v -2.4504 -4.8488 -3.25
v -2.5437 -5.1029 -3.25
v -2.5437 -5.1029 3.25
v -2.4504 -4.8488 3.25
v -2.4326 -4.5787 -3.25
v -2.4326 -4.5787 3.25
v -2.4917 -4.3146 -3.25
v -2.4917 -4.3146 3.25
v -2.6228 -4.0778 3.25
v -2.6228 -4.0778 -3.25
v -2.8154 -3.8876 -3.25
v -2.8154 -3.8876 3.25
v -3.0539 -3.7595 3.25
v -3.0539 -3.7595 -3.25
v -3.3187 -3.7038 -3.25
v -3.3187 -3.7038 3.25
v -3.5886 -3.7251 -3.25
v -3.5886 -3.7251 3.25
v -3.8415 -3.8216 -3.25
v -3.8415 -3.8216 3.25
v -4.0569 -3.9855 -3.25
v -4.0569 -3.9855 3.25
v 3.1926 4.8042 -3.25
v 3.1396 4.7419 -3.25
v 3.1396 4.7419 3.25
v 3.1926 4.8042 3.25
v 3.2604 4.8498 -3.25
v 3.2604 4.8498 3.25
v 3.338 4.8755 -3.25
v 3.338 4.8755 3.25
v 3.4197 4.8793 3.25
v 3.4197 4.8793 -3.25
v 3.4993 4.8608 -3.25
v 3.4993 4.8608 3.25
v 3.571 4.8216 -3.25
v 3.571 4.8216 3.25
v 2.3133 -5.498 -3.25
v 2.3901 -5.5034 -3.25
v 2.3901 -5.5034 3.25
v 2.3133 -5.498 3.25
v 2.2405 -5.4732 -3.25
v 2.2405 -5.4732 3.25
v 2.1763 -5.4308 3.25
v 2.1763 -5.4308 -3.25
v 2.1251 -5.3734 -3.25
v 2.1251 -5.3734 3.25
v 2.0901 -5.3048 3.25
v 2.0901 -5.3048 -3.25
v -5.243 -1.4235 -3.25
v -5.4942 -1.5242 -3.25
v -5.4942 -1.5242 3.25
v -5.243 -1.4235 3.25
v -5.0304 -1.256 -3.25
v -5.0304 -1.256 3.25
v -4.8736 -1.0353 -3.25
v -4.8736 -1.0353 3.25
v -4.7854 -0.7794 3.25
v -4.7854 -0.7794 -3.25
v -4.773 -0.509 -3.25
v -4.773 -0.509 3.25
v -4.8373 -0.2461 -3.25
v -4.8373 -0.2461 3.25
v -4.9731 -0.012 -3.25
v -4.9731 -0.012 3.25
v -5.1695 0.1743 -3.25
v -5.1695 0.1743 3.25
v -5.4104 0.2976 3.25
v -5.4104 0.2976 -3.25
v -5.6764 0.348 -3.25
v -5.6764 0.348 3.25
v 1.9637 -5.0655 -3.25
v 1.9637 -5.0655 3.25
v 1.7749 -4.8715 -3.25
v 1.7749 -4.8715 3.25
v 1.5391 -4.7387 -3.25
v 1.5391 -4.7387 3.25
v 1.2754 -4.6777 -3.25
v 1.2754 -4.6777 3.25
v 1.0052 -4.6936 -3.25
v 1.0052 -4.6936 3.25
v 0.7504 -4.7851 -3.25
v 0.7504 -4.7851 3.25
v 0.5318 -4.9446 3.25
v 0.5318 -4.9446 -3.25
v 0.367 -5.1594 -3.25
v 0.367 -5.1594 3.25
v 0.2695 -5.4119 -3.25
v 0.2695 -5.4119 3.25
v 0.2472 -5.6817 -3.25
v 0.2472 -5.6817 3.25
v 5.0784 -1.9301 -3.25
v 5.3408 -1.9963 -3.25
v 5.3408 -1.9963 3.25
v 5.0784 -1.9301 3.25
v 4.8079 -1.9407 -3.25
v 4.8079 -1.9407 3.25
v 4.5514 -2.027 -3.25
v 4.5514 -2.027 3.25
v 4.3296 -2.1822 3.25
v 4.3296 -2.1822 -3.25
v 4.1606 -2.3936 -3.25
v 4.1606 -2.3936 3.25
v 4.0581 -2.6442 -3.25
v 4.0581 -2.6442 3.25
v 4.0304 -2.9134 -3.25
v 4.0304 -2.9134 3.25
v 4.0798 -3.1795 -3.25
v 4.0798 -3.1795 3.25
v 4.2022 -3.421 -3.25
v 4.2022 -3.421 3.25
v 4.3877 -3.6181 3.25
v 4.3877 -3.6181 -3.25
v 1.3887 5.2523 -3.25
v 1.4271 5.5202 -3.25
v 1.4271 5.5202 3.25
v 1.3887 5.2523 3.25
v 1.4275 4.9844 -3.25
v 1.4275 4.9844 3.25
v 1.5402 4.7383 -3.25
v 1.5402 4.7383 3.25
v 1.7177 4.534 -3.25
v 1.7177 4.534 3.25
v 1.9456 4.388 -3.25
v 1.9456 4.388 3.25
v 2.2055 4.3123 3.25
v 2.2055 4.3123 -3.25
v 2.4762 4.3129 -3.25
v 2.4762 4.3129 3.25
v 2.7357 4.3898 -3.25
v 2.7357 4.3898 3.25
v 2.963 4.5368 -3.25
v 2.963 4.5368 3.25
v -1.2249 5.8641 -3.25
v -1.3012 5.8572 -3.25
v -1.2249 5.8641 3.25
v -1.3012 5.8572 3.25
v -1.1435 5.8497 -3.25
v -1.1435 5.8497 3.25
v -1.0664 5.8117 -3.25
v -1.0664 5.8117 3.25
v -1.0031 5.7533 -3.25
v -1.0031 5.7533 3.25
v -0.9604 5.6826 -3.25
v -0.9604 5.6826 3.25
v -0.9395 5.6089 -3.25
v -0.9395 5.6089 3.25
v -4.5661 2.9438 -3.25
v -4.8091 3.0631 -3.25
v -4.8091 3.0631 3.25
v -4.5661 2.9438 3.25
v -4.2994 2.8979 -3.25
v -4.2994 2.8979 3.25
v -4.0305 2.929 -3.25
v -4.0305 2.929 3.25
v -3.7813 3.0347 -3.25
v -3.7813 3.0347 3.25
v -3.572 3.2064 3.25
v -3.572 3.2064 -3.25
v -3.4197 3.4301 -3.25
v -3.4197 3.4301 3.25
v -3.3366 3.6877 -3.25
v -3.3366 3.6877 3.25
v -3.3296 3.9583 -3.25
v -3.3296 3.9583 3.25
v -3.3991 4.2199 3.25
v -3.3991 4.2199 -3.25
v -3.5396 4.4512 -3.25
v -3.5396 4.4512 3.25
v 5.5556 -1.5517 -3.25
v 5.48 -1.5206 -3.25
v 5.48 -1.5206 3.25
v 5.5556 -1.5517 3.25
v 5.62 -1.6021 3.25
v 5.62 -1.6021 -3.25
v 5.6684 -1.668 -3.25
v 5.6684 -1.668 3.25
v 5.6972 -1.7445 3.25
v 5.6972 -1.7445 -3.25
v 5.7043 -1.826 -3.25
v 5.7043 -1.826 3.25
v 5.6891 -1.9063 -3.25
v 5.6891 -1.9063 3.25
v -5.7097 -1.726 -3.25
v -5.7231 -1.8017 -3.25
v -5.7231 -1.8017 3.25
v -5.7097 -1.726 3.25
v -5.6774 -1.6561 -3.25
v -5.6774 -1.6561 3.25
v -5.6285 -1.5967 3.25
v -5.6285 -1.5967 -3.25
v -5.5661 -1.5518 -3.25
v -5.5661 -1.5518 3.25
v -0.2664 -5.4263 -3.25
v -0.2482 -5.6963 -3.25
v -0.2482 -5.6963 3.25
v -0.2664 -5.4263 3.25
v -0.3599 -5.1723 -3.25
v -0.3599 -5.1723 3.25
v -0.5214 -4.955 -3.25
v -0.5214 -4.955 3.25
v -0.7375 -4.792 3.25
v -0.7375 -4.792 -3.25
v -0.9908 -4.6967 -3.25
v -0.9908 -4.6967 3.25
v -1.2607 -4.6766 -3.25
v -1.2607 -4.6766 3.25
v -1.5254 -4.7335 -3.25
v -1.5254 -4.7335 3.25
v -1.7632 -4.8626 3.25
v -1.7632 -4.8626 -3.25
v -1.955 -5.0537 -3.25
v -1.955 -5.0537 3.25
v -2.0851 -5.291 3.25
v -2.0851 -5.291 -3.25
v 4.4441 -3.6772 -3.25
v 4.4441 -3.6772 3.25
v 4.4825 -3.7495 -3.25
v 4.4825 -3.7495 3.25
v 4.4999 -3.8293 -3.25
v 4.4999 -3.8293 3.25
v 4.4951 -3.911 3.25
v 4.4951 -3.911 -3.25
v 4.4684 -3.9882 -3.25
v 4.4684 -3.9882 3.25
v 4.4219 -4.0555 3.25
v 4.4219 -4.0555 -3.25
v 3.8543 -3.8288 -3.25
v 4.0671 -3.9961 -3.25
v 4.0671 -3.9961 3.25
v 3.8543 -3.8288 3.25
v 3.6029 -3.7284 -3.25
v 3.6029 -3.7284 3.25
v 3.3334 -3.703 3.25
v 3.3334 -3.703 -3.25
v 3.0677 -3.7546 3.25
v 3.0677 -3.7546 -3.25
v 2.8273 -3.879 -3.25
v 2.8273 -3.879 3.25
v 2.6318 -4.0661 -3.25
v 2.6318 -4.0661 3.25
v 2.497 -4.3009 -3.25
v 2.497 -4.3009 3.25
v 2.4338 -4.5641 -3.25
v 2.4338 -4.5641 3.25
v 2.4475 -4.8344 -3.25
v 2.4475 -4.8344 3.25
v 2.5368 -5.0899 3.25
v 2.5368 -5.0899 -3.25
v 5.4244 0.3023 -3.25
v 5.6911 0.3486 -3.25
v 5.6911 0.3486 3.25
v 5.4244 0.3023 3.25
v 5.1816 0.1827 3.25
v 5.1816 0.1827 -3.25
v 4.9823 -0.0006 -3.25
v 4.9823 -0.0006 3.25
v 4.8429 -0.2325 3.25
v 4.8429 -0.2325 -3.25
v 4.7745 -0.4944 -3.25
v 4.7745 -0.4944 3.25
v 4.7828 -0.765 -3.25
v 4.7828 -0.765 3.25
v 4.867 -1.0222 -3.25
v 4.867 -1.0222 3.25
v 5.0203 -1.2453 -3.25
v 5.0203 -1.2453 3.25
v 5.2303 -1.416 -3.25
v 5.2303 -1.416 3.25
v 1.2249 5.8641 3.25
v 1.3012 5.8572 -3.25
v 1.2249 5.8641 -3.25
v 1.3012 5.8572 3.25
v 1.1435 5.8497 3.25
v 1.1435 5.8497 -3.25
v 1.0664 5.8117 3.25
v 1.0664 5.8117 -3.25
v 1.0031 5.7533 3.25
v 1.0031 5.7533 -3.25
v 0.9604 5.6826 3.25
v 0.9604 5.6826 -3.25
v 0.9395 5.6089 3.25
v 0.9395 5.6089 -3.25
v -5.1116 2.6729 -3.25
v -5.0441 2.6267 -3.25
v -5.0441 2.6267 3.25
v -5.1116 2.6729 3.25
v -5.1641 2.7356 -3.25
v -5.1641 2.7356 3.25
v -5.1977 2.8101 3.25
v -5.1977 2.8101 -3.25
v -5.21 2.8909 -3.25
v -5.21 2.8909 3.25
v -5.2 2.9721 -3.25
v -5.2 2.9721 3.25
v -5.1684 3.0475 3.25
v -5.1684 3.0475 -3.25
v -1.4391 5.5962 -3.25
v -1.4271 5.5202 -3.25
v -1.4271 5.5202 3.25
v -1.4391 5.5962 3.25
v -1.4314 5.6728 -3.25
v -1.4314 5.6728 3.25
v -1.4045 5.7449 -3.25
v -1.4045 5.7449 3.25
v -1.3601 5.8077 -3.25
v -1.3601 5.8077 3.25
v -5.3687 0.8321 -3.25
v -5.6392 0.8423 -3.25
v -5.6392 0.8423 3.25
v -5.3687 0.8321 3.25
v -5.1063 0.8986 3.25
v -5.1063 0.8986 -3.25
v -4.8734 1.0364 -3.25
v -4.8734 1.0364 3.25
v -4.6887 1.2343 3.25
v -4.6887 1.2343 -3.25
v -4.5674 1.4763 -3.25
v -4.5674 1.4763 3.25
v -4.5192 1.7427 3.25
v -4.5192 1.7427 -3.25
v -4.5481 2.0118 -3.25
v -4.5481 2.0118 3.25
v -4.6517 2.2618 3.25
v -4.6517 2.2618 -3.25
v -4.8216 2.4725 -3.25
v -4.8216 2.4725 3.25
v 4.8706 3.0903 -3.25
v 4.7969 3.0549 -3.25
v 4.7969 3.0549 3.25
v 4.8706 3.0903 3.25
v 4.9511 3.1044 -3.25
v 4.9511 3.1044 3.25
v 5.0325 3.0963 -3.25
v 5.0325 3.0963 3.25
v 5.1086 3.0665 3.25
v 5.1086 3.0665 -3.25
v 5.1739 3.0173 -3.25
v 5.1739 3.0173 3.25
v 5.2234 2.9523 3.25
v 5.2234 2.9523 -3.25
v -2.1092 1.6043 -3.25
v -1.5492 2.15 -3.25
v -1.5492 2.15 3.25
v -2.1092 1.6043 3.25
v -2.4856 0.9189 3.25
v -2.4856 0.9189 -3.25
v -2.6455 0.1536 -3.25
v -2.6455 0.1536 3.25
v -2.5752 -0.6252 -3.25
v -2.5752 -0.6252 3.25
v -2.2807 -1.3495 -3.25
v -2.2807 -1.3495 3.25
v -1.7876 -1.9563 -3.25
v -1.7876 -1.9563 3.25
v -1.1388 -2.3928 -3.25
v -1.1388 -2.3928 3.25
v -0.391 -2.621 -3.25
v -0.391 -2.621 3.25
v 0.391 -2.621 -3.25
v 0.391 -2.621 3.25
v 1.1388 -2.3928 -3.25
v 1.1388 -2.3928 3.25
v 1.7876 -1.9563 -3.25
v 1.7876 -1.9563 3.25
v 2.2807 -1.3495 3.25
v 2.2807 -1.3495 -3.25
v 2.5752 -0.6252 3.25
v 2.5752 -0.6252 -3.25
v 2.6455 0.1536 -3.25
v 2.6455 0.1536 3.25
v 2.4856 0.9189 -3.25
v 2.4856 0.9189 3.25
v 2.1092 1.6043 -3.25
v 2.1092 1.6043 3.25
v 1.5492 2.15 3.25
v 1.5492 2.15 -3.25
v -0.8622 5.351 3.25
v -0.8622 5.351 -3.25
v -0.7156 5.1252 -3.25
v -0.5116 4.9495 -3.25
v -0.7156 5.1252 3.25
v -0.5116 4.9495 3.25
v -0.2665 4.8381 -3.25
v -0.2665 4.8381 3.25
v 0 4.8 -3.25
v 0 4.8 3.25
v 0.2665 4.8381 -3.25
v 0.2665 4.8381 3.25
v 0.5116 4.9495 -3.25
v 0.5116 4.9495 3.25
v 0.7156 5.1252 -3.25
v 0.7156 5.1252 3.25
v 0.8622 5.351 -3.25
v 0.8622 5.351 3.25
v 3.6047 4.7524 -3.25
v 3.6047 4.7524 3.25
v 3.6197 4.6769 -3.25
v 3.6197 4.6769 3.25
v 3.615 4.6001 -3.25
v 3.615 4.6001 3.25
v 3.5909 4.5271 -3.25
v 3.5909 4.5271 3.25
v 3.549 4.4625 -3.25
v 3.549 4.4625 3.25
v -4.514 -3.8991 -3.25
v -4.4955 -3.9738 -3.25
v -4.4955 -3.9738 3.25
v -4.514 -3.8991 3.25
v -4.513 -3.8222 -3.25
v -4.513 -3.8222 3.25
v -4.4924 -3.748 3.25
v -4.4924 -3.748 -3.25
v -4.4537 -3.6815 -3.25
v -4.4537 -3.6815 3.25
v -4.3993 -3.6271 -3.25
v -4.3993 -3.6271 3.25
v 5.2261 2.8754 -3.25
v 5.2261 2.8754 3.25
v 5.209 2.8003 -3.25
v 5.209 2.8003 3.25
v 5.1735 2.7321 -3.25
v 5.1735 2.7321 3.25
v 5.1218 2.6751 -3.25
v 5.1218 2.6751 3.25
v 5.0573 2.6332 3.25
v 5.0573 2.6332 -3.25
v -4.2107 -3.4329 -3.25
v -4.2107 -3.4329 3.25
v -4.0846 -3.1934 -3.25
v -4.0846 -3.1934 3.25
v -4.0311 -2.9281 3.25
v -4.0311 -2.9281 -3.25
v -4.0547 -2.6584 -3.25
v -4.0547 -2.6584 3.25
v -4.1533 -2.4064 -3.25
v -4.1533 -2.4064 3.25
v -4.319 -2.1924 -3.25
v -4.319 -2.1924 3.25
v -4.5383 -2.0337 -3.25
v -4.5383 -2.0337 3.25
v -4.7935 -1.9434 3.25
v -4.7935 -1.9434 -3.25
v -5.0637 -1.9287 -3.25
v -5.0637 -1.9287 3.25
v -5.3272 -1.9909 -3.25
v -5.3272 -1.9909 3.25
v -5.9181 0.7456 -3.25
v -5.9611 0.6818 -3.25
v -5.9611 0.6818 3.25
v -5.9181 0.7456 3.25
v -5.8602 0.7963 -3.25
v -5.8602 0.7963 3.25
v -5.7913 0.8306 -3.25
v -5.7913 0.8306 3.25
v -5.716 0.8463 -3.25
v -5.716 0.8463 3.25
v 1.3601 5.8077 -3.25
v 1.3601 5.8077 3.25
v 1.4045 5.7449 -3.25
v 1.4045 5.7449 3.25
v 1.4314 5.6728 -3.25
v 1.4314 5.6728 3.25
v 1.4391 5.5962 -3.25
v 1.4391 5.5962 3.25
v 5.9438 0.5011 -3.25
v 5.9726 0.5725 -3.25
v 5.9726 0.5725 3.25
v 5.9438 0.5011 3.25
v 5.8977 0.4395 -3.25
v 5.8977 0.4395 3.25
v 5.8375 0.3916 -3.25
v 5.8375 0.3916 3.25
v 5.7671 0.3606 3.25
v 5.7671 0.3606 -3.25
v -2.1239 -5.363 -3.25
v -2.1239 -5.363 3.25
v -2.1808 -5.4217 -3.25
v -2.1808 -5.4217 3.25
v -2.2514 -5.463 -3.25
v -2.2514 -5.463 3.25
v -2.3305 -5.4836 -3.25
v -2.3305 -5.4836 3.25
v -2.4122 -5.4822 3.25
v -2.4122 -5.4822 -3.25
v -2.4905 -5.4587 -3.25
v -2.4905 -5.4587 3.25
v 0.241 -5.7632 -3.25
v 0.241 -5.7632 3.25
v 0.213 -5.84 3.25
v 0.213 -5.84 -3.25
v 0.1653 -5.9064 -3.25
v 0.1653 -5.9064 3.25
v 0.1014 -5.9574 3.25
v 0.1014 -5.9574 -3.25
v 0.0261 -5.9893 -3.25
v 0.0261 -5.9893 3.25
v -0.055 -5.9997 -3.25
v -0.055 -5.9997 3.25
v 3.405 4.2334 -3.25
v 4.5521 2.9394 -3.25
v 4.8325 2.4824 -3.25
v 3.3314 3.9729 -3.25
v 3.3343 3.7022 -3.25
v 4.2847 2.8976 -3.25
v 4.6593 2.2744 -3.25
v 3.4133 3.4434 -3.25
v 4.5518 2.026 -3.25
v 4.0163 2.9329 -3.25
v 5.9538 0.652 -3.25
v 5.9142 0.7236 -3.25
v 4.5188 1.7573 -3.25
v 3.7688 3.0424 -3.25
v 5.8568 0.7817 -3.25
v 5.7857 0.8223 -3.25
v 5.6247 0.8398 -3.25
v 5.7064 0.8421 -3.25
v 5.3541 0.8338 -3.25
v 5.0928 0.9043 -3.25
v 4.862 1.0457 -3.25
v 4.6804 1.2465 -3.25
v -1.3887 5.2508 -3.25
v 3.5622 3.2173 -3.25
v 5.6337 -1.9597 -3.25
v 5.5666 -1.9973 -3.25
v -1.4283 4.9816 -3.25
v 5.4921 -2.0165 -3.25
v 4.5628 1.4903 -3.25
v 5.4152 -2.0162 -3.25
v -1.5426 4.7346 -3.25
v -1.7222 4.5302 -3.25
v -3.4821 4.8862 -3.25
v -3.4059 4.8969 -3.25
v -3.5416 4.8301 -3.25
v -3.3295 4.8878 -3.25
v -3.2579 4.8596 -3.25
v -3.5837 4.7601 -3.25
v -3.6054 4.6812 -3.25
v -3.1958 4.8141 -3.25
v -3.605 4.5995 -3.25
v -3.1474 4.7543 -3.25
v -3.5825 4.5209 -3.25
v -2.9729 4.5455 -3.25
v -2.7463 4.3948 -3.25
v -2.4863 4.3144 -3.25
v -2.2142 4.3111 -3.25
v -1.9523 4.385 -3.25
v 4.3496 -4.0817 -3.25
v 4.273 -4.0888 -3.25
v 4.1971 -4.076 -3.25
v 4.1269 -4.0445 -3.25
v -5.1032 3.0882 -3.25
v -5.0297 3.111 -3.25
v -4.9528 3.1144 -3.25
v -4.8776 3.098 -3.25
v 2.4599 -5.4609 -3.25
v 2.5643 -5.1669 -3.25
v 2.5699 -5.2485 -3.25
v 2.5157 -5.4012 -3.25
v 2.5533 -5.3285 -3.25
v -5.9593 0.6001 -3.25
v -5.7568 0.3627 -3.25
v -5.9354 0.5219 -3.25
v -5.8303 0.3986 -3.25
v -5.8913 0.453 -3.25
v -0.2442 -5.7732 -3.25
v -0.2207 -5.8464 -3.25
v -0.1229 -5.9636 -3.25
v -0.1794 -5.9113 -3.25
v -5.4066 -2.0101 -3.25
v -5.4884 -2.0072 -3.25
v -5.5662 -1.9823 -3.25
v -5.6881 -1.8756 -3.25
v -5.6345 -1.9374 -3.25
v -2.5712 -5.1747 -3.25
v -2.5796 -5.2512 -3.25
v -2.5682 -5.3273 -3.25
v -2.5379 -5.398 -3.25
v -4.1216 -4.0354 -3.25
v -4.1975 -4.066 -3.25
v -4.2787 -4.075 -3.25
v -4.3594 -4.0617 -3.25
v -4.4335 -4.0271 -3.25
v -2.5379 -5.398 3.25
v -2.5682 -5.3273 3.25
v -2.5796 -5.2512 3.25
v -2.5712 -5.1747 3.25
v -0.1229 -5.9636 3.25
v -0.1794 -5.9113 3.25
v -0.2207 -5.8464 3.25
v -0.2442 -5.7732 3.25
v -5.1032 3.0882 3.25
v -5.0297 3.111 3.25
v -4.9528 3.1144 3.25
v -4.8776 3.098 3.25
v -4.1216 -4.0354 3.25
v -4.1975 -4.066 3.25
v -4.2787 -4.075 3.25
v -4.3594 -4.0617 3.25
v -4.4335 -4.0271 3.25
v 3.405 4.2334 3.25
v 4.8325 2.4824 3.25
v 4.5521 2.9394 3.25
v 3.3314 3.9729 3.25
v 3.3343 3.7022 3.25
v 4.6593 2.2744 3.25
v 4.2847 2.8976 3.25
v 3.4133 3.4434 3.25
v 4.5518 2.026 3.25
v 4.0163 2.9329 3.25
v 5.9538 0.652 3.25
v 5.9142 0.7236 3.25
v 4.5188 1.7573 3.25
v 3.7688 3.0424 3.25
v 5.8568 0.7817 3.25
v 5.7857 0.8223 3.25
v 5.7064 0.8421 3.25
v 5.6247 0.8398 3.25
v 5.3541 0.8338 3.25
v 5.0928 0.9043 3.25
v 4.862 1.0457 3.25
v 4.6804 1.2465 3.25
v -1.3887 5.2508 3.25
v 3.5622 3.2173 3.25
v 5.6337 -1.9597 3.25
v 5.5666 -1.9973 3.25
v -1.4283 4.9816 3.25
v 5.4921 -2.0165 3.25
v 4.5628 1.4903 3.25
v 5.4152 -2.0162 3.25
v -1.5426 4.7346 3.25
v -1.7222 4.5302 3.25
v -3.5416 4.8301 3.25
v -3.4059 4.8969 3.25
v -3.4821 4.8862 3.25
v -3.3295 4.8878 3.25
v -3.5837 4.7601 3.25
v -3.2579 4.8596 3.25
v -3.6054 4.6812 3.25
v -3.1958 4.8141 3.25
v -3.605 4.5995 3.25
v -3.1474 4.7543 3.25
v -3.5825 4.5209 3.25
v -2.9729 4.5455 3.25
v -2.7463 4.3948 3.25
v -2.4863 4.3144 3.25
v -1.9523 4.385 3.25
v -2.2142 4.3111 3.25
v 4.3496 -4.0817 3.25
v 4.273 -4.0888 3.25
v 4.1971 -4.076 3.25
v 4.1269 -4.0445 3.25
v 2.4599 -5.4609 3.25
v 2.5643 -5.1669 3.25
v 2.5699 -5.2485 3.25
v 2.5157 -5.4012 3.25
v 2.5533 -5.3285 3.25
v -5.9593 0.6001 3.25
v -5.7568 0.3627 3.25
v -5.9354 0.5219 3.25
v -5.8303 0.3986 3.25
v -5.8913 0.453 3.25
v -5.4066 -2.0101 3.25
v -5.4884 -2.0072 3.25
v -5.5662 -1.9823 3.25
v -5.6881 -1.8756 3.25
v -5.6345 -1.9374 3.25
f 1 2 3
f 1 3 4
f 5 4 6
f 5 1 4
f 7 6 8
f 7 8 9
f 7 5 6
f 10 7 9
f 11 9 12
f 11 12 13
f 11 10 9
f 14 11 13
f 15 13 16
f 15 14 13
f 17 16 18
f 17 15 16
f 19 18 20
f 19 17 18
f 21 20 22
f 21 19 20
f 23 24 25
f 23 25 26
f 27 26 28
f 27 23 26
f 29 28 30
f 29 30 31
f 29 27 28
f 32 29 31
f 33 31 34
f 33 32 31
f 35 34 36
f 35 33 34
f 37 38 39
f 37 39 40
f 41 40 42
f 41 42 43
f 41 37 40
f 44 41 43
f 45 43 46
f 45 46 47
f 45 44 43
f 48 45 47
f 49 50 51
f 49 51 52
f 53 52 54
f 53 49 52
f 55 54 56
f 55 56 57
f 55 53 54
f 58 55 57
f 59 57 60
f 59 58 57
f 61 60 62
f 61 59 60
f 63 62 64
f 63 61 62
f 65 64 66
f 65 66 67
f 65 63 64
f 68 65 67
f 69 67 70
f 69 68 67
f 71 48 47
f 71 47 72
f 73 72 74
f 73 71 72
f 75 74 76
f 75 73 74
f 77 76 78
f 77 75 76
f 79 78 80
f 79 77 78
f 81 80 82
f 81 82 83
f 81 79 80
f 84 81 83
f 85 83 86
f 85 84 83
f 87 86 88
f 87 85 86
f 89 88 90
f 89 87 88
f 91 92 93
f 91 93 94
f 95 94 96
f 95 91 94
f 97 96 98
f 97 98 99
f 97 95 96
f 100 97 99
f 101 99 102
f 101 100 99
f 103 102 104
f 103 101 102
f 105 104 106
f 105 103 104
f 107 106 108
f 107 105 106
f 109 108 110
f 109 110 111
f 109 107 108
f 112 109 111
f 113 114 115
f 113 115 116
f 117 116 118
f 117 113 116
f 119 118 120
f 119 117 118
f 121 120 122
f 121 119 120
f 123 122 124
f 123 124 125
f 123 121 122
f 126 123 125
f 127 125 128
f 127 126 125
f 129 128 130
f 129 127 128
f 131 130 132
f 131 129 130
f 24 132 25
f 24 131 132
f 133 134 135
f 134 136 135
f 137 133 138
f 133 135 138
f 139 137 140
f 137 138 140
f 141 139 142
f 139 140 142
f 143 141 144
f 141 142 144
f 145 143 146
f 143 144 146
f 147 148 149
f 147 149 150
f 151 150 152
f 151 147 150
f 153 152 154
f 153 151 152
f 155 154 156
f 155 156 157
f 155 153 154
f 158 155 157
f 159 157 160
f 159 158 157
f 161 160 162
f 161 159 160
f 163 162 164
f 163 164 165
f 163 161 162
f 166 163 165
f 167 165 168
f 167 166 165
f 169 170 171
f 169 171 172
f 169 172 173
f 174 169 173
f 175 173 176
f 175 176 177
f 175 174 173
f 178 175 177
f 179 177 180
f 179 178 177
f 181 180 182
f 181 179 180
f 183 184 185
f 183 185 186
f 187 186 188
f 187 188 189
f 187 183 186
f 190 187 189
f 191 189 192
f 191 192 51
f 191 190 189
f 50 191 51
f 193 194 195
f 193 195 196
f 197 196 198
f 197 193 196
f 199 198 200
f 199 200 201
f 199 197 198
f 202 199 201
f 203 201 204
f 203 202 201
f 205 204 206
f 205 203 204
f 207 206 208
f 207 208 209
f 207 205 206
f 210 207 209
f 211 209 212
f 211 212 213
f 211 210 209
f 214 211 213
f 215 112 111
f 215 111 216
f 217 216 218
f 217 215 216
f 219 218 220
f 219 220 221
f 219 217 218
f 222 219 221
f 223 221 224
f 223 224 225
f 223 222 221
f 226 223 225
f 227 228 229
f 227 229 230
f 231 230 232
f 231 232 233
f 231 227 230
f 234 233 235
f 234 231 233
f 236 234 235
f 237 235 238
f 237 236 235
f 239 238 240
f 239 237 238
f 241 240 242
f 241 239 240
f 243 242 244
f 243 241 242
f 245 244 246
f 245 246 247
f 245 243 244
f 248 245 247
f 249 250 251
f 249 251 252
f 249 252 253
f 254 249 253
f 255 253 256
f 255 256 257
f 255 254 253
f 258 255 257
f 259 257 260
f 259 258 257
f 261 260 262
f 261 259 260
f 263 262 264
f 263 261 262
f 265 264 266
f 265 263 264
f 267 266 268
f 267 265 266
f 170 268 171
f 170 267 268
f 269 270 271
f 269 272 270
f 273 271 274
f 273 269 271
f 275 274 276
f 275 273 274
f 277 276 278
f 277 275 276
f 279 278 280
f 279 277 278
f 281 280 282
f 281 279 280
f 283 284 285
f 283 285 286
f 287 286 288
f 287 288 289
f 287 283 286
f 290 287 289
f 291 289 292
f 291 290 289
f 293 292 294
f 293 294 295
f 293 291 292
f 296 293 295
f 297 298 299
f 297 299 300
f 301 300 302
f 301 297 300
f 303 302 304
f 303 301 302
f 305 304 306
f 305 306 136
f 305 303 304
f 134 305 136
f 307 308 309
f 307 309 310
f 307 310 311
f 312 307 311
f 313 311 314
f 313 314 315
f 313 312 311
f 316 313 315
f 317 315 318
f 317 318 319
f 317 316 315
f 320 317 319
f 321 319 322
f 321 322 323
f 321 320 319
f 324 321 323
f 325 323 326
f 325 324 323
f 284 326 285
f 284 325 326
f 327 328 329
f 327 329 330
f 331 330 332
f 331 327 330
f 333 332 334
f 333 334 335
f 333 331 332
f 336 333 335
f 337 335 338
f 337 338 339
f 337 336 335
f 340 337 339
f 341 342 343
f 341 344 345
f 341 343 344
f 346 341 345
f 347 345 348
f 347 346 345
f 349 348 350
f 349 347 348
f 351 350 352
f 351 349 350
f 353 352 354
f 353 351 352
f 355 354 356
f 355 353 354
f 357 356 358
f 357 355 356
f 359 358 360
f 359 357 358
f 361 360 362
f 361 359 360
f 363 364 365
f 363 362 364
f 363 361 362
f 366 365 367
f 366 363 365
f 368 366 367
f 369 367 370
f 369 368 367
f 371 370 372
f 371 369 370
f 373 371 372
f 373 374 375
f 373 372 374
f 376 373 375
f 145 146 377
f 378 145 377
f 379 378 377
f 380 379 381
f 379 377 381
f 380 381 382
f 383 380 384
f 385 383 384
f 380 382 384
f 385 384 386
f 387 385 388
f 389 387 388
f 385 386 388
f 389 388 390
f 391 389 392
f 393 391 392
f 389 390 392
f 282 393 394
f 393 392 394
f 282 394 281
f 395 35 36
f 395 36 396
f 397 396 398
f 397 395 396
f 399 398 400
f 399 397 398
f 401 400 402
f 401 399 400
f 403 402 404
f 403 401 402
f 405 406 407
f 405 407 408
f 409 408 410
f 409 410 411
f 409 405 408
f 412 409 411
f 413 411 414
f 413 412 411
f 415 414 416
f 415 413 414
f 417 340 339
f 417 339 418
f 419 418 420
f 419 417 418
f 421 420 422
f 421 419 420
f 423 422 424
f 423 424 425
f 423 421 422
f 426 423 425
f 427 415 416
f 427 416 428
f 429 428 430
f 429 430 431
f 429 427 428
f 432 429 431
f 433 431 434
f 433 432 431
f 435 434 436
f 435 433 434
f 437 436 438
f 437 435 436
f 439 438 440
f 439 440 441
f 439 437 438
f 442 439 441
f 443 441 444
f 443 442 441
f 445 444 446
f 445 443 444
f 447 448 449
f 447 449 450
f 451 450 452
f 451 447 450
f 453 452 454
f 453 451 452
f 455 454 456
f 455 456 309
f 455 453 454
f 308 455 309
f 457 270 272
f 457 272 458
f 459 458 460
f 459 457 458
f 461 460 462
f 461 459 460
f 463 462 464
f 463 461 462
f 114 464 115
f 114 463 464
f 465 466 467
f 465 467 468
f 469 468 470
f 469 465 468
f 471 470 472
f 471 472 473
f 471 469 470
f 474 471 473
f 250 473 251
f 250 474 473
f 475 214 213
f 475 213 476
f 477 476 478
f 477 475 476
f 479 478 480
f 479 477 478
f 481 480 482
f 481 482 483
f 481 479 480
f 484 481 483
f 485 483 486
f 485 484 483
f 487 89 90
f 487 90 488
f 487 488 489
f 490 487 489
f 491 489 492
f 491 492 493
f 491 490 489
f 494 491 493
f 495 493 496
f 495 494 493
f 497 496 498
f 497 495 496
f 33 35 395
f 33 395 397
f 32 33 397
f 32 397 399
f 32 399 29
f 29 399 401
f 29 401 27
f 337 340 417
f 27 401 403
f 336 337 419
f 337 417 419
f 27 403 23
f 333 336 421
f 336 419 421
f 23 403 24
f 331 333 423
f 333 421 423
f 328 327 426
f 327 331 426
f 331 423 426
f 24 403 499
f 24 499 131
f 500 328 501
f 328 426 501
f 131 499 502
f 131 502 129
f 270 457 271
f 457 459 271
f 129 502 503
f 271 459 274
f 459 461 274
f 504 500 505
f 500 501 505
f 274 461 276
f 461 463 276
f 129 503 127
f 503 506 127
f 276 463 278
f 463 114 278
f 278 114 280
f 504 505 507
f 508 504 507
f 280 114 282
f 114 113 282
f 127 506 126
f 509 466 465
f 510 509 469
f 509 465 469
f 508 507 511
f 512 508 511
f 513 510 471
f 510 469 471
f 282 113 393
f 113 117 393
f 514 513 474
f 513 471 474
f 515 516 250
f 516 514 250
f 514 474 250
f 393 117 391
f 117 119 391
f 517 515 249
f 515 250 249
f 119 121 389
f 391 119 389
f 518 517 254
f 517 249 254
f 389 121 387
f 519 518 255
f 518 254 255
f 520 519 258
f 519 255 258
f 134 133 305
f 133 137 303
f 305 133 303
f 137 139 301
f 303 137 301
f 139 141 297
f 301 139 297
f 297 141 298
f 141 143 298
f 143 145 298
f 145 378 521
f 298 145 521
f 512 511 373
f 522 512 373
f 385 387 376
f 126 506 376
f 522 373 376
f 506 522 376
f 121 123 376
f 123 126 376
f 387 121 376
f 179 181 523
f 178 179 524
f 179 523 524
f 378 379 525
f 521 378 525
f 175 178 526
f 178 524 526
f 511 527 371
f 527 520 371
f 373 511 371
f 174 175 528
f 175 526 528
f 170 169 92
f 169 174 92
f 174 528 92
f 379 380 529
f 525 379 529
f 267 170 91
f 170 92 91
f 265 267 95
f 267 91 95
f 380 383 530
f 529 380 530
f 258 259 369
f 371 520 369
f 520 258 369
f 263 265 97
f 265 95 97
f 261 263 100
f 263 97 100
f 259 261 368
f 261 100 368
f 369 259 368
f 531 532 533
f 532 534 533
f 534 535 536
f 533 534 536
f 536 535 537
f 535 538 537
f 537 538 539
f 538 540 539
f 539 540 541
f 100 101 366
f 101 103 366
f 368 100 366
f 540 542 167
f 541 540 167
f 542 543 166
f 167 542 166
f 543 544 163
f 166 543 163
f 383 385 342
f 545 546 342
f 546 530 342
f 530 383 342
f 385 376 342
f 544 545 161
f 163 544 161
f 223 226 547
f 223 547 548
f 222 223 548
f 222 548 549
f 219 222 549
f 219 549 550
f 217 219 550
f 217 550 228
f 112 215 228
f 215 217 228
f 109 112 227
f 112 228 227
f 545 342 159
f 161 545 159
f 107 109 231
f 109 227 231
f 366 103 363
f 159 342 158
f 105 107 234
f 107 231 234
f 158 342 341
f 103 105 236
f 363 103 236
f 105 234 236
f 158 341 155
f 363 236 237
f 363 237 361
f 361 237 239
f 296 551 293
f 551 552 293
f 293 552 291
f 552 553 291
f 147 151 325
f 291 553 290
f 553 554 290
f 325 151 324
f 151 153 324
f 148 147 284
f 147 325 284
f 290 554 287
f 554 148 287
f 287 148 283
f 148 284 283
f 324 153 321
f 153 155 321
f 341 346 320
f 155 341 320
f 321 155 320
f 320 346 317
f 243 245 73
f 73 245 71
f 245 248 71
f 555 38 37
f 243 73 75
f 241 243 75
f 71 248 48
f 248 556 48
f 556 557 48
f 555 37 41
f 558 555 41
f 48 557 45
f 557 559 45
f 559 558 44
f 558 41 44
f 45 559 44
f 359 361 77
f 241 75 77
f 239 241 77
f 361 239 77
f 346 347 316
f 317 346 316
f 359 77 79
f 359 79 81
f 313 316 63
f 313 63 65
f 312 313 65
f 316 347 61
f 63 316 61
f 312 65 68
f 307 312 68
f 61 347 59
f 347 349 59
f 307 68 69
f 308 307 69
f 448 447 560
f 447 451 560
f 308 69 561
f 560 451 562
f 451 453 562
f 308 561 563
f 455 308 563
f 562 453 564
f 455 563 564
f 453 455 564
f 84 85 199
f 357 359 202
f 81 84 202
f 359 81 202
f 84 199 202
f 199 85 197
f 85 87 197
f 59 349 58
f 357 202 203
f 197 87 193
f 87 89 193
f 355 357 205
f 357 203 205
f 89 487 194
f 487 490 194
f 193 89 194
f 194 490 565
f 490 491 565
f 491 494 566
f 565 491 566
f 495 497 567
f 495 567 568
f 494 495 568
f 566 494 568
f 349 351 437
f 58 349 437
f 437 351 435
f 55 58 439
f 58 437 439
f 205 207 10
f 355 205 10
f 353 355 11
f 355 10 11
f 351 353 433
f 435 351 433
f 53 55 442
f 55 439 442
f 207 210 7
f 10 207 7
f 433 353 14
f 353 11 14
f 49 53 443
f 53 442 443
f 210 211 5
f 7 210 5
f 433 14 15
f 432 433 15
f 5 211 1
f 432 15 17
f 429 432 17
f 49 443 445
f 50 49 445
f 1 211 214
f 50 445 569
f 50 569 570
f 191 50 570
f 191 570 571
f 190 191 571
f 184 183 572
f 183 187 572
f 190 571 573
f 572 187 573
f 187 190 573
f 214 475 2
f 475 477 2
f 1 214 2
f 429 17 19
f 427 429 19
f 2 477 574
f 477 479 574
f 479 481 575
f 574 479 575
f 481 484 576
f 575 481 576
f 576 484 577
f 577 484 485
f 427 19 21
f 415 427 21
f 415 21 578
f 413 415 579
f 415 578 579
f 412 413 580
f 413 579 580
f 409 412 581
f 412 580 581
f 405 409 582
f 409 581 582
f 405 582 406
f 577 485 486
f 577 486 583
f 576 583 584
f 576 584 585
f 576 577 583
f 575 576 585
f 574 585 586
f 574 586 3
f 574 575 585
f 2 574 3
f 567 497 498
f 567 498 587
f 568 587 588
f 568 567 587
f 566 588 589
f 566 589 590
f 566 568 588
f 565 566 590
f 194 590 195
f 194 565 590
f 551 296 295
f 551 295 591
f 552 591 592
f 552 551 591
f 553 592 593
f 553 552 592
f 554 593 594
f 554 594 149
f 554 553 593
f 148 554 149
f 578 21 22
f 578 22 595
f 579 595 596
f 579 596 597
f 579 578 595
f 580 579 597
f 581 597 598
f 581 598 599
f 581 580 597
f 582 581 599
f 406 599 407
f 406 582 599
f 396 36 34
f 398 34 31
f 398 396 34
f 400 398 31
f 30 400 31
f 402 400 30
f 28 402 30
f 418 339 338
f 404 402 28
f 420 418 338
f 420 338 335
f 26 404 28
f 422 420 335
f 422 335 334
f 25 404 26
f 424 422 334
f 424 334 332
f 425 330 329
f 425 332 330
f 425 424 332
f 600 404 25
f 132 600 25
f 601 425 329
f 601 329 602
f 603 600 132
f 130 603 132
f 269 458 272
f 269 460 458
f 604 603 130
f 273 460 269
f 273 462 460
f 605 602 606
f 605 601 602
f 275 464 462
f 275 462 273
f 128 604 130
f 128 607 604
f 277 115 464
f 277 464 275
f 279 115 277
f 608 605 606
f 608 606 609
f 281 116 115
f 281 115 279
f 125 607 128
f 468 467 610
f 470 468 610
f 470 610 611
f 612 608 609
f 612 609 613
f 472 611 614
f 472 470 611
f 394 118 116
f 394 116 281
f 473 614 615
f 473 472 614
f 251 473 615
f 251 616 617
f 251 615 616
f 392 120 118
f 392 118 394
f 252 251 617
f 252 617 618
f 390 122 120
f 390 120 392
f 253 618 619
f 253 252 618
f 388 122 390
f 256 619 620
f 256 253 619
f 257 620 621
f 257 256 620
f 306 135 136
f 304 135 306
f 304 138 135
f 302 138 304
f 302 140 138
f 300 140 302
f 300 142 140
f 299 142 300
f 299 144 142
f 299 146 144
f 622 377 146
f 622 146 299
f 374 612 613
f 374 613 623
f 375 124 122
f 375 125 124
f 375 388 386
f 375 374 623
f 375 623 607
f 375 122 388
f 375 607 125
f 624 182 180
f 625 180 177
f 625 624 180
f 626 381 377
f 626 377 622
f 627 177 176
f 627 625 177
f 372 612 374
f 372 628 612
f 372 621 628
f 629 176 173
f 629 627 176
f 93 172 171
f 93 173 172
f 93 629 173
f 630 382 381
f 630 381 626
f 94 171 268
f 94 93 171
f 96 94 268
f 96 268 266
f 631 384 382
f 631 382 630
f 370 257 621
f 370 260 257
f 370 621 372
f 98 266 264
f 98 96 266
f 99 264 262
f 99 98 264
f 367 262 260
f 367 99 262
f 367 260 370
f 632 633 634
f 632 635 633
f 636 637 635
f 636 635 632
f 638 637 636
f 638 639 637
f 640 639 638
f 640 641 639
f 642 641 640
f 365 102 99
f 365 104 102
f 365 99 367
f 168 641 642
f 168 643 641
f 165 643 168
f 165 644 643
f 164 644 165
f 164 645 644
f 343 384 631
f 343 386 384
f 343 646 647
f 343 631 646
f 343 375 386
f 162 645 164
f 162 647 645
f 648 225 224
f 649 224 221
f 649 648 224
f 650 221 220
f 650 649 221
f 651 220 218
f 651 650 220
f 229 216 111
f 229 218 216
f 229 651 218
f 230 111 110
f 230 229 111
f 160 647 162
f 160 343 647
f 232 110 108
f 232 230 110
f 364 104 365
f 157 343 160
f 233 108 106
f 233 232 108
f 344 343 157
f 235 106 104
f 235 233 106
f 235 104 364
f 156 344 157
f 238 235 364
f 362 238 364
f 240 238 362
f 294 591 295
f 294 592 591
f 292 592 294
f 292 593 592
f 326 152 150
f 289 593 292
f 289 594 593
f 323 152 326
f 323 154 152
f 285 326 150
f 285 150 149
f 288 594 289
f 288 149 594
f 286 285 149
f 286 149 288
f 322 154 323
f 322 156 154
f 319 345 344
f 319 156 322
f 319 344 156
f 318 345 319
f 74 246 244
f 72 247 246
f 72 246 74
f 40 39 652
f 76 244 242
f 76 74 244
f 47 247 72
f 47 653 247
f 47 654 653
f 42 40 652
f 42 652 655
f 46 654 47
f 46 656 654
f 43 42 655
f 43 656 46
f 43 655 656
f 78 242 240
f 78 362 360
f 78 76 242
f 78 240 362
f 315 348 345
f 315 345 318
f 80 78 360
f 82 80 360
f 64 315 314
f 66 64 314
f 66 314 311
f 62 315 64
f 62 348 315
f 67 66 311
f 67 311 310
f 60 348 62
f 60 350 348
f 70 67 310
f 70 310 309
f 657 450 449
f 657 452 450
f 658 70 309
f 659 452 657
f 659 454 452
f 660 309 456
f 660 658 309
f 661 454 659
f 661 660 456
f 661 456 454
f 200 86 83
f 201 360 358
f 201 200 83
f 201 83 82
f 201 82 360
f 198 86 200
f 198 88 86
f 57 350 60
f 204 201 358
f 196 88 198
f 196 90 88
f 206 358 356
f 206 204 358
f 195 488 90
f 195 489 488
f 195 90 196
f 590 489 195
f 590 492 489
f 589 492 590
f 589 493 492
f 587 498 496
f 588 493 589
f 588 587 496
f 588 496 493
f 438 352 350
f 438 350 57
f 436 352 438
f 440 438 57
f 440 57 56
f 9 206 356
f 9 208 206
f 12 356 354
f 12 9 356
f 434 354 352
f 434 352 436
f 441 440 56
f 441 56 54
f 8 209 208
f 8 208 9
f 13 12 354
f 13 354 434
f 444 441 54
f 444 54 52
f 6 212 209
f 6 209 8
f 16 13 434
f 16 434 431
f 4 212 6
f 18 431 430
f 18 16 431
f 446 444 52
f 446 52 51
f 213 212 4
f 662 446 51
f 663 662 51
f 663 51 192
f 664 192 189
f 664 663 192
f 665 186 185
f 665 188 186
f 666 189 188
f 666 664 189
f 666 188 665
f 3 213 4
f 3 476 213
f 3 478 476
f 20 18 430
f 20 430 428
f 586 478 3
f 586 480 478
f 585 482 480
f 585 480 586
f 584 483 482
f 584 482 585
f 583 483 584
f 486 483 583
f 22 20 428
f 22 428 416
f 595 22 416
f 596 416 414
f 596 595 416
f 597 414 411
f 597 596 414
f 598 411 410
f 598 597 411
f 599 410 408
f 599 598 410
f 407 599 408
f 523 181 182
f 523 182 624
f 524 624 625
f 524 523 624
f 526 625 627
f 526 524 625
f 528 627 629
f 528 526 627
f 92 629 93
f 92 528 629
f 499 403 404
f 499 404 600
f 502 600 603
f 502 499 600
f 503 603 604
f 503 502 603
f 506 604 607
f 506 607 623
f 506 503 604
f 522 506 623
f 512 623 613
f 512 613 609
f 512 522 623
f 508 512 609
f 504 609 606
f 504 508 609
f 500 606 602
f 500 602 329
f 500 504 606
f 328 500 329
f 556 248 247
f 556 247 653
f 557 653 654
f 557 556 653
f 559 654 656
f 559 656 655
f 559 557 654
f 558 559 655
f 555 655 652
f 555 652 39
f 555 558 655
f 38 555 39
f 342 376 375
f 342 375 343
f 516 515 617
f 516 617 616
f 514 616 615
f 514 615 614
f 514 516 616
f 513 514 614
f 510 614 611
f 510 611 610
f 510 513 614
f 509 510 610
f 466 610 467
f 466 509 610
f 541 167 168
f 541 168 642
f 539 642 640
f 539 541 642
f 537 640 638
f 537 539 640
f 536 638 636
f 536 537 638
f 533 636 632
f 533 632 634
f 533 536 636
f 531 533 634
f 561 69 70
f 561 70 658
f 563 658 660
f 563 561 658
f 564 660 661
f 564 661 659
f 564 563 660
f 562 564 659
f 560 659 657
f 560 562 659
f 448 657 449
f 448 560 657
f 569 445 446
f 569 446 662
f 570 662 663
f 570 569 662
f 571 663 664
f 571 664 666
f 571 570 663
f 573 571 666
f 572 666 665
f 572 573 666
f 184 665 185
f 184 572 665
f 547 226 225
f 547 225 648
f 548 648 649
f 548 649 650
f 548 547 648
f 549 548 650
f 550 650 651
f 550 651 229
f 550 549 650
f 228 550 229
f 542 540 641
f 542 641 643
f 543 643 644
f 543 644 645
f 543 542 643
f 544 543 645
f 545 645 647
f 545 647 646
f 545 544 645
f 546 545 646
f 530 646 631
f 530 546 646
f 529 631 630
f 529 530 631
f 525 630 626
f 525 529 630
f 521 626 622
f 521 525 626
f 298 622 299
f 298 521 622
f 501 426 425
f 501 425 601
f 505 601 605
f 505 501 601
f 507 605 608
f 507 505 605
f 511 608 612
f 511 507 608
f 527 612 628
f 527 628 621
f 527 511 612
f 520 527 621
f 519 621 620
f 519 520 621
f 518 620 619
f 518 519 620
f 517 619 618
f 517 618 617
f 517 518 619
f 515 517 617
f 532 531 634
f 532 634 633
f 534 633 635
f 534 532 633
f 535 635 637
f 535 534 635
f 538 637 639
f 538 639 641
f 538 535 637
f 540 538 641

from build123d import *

# Parameters (mm, degrees)
SKIZZE1_R                            = 6
AUFSATZ_LINEAR_AUSTRAGEN1_DEPTH      = 3.25
SCHNITT_LINEAR_AUSTRAGEN1_DEPTH      = 10.086390923
VERRUNDUNG2_R                        = 0.3
KREISMUSTER1_START                   = -3.25
KREISMUSTER1_DEPTH                   = 6.5
SCHNITT_LINEAR_AUSTRAGEN2_DEPTH      = 10.068181427
SCHNITT_LINEAR_AUSTRAGEN2_DEPTH_BACK = 10.068181427


# Read off the part's stored shape, not the designer's step: Kreismuster1
with BuildPart() as part:
    # Skizze1 → Aufsatz-Linear austragen1 (new, symmetric)
    with BuildSketch(Plane.XY):
        with Locations(Location((0, 0, 0), (0, 0, 180))):
            Circle(SKIZZE1_R)
    extrude(amount=AUFSATZ_LINEAR_AUSTRAGEN1_DEPTH, both=True)

    # Skizze2 → Schnitt-Linear austragen1 (cut, symmetric)
    with BuildSketch(Plane.XY):
        with BuildLine():
            Line((0.95, 5.75), (0.95, 6))
            Line((0.95, 6), (-0.95, 6))
            Line((-0.95, 6), (-0.95, 5.75))
            ThreePointArc((-0.95, 5.75), (0, 4.8), (0.95, 5.75))
        make_face()
    extrude(amount=SCHNITT_LINEAR_AUSTRAGEN1_DEPTH, both=True, mode=Mode.SUBTRACT)

    # Verrundung2
    verrundung2_edges = [part.edges().sort_by_distance(p)[0] for p in [
        (0.95, 5.924314306, 0),
        (-0.95, 5.924314306, 0),
    ]]
    fillet(verrundung2_edges, radius=VERRUNDUNG2_R)

    # Kreismuster1 outline → Kreismuster1 (cut)
    with BuildSketch(Plane.XY.offset(KREISMUSTER1_START)):
        with BuildLine():
            ThreePointArc((1.301196241, 5.857208238), (1.4202728, 5.709694635), (1.427132072, 5.520241632))
            ThreePointArc((1.427132072, 5.520241632), (1.945632522, 4.388033855), (3.139589709, 4.741874783))
            ThreePointArc((3.139589709, 4.741874783), (3.337990982, 4.875510752), (3.571043132, 4.821581789))
            ThreePointArc((3.571043132, 4.821581789), (2.49054405, 5.458680274), (1.301196241, 5.857208238))
        make_face()
        with BuildLine():
            ThreePointArc((-1.301196241, 5.857208238), (-2.440419859, 5.481272746), (-3.482083764, 4.886214553))
            ThreePointArc((-3.482083764, 4.886214553), (-3.292782023, 4.875999815), (-3.147401255, 4.754328445))
            ThreePointArc((-3.147401255, 4.754328445), (-1.952335887, 4.385018197), (-1.427132072, 5.520241632))
            ThreePointArc((-1.427132072, 5.520241632), (-1.4202728, 5.709694635), (-1.301196241, 5.857208238))
        make_face()
        with BuildLine():
            ThreePointArc((-3.482083764, 4.886214553), (-4.421893009, 4.055473119), (-5.168444311, 3.047488049))
            ThreePointArc((-5.168444311, 3.047488049), (-4.991353857, 3.115152376), (-4.809053712, 3.063131734))
            ThreePointArc((-4.809053712, 3.063131734), (-3.572034677, 3.206383521), (-3.539604337, 4.451247144))
            ThreePointArc((-3.539604337, 4.451247144), (-3.60539033, 4.681233753), (-3.482083764, 4.886214553))
        make_face()
        with BuildLine():
            ThreePointArc((-5.168444311, 3.047488049), (-5.689109795, 1.906313128), (-5.961133882, 0.681823175))
            ThreePointArc((-5.961133882, 0.681823175), (-5.826875264, 0.815666791), (-5.639177093, 0.842291719))
            ThreePointArc((-5.639177093, 0.842291719), (-4.567369724, 1.476299708), (-5.044074785, 2.626729824))
            ThreePointArc((-5.044074785, 2.626729824), (-5.197717262, 2.810075472), (-5.168444311, 3.047488049))
        make_face()
        with BuildLine():
            ThreePointArc((-5.961133882, 0.681823175), (-5.972627813, -0.572465721), (-5.72308925, -1.801735119))
            ThreePointArc((-5.72308925, -1.801735119), (-5.654877001, -1.624854993), (-5.494235524, -1.524188187))
            ThreePointArc((-5.494235524, -1.524188187), (-4.772965052, -0.509049737), (-5.676378878, 0.348027053))
            ThreePointArc((-5.676378878, 0.348027053), (-5.891311659, 0.453029612), (-5.961133882, 0.681823175))
        make_face()
        with BuildLine():
            ThreePointArc((-5.72308925, -1.801735119), (-5.223424224, -2.952260046), (-4.495470494, -3.973757043))
            ThreePointArc((-4.495470494, -3.973757043), (-4.505099133, -3.784424586), (-4.39929072, -3.627122108))
            ThreePointArc((-4.39929072, -3.627122108), (-4.153271361, -2.406379857), (-5.327185496, -1.990852756))
            ThreePointArc((-5.327185496, -1.990852756), (-5.566244749, -1.982349183), (-5.72308925, -1.801735119))
        make_face()
        with BuildLine():
            ThreePointArc((-4.495470494, -3.973757043), (-3.571043132, -4.821581789), (-2.490544049, -5.458680274))
            ThreePointArc((-2.490544049, -5.458680274), (-2.576348697, -5.289632788), (-2.543668584, -5.102893665))
            ThreePointArc((-2.543668584, -5.102893665), (-2.815439322, -3.887625039), (-4.056873345, -3.985496038))
            ThreePointArc((-4.056873345, -3.985496038), (-4.278723555, -4.074961795), (-4.495470494, -3.973757043))
        make_face()
        with BuildLine():
            ThreePointArc((-2.490544049, -5.458680274), (-1.301196241, -5.857208238), (-0.054979913, -5.999748095))
            ThreePointArc((-0.054979913, -5.999748095), (-0.202124166, -5.880215427), (-0.248223041, -5.69632855))
            ThreePointArc((-0.248223041, -5.69632855), (-0.990792245, -4.696664534), (-2.085090937, -5.291010847))
            ThreePointArc((-2.085090937, -5.291010847), (-2.251372186, -5.462976493), (-2.490544049, -5.458680274))
        make_face()
        with BuildLine():
            ThreePointArc((-0.054979913, -5.999748095), (1.193639301, -5.880070171), (2.39009075, -5.503404965))
            ThreePointArc((2.39009075, -5.503404965), (2.20704947, -5.454055398), (2.090142521, -5.304816478))
            ThreePointArc((2.090142521, -5.304816478), (1.005171811, -4.693608063), (0.247222636, -5.681661814))
            ThreePointArc((0.247222636, -5.681661814), (0.165261886, -5.906392926), (-0.054979913, -5.999748095))
        make_face()
        with BuildLine():
            ThreePointArc((2.39009075, -5.503404965), (3.482083764, -4.886214553), (4.421893009, -4.055473119))
            ThreePointArc((4.421893009, -4.055473119), (4.234604202, -4.084839642), (4.067103452, -3.996053445))
            ThreePointArc((4.067103452, -3.996053445), (2.82733253, -3.878984118), (2.53678917, -5.089901837))
            ThreePointArc((2.53678917, -5.089901837), (2.553320677, -5.328540364), (2.39009075, -5.503404965))
        make_face()
        with BuildLine():
            ThreePointArc((4.421893009, -4.055473119), (5.168444311, -3.047488049), (5.689109795, -1.906313128))
            ThreePointArc((5.689109795, -1.906313128), (5.529957397, -2.009318003), (5.340825248, -1.996336468))
            ThreePointArc((5.340825248, -1.996336468), (4.160621768, -2.393648579), (4.38772181, -3.618051592))
            ThreePointArc((4.38772181, -3.618051592), (4.499887126, -3.829334765), (4.421893009, -4.055473119))
        make_face()
        with BuildLine():
            ThreePointArc((5.689109795, -1.906313128), (5.961133882, -0.681823176), (5.972627814, 0.572465721))
            ThreePointArc((5.972627814, 0.572465721), (5.86913072, 0.413632974), (5.691069839, 0.34856522))
            ThreePointArc((5.691069839, 0.34856522), (4.774501705, -0.494429456), (5.479977488, -1.520607358))
            ThreePointArc((5.479977488, -1.520607358), (5.668382211, -1.668002397), (5.689109795, -1.906313128))
        make_face()
        with BuildLine():
            ThreePointArc((5.972627814, 0.572465721), (5.72308925, 1.801735119), (5.223424223, 2.952260047))
            ThreePointArc((5.223424223, 2.952260047), (5.193478023, 2.765063051), (5.057276753, 2.633196816))
            ThreePointArc((5.057276753, 2.633196816), (4.562826922, 1.490281013), (5.624695274, 0.839763703))
            ThreePointArc((5.624695274, 0.839763703), (5.856762517, 0.78174274), (5.972627814, 0.572465721))
        make_face()
        with BuildLine():
            ThreePointArc((5.223424223, 2.952260047), (4.495470494, 3.973757044), (3.571043132, 4.821581789))
            ThreePointArc((3.571043132, 4.821581789), (3.619825794, 4.638388607), (3.549034572, 4.462524759))
            ThreePointArc((3.549034572, 4.462524759), (3.562197912, 3.217308355), (4.796852148, 3.05493199))
            ThreePointArc((4.796852148, 3.05493199), (5.032455375, 3.096317454), (5.223424223, 2.952260047))
        make_face()
    extrude(amount=KREISMUSTER1_DEPTH, mode=Mode.SUBTRACT)

    # Skizze3 → Schnitt-Linear austragen2 (cut, two sides: drawn at the far end of the back side and taken through both)
    with BuildSketch(Plane.XY.offset(-SCHNITT_LINEAR_AUSTRAGEN2_DEPTH_BACK)):
        with BuildLine():
            Line((1.549193338, 2.15), (-1.549193338, 2.15))
            ThreePointArc((-1.549193338, 2.15), (0, -2.65), (1.549193338, 2.15))
        make_face()
    extrude(amount=SCHNITT_LINEAR_AUSTRAGEN2_DEPTH + SCHNITT_LINEAR_AUSTRAGEN2_DEPTH_BACK, mode=Mode.SUBTRACT)


solid = part.part
